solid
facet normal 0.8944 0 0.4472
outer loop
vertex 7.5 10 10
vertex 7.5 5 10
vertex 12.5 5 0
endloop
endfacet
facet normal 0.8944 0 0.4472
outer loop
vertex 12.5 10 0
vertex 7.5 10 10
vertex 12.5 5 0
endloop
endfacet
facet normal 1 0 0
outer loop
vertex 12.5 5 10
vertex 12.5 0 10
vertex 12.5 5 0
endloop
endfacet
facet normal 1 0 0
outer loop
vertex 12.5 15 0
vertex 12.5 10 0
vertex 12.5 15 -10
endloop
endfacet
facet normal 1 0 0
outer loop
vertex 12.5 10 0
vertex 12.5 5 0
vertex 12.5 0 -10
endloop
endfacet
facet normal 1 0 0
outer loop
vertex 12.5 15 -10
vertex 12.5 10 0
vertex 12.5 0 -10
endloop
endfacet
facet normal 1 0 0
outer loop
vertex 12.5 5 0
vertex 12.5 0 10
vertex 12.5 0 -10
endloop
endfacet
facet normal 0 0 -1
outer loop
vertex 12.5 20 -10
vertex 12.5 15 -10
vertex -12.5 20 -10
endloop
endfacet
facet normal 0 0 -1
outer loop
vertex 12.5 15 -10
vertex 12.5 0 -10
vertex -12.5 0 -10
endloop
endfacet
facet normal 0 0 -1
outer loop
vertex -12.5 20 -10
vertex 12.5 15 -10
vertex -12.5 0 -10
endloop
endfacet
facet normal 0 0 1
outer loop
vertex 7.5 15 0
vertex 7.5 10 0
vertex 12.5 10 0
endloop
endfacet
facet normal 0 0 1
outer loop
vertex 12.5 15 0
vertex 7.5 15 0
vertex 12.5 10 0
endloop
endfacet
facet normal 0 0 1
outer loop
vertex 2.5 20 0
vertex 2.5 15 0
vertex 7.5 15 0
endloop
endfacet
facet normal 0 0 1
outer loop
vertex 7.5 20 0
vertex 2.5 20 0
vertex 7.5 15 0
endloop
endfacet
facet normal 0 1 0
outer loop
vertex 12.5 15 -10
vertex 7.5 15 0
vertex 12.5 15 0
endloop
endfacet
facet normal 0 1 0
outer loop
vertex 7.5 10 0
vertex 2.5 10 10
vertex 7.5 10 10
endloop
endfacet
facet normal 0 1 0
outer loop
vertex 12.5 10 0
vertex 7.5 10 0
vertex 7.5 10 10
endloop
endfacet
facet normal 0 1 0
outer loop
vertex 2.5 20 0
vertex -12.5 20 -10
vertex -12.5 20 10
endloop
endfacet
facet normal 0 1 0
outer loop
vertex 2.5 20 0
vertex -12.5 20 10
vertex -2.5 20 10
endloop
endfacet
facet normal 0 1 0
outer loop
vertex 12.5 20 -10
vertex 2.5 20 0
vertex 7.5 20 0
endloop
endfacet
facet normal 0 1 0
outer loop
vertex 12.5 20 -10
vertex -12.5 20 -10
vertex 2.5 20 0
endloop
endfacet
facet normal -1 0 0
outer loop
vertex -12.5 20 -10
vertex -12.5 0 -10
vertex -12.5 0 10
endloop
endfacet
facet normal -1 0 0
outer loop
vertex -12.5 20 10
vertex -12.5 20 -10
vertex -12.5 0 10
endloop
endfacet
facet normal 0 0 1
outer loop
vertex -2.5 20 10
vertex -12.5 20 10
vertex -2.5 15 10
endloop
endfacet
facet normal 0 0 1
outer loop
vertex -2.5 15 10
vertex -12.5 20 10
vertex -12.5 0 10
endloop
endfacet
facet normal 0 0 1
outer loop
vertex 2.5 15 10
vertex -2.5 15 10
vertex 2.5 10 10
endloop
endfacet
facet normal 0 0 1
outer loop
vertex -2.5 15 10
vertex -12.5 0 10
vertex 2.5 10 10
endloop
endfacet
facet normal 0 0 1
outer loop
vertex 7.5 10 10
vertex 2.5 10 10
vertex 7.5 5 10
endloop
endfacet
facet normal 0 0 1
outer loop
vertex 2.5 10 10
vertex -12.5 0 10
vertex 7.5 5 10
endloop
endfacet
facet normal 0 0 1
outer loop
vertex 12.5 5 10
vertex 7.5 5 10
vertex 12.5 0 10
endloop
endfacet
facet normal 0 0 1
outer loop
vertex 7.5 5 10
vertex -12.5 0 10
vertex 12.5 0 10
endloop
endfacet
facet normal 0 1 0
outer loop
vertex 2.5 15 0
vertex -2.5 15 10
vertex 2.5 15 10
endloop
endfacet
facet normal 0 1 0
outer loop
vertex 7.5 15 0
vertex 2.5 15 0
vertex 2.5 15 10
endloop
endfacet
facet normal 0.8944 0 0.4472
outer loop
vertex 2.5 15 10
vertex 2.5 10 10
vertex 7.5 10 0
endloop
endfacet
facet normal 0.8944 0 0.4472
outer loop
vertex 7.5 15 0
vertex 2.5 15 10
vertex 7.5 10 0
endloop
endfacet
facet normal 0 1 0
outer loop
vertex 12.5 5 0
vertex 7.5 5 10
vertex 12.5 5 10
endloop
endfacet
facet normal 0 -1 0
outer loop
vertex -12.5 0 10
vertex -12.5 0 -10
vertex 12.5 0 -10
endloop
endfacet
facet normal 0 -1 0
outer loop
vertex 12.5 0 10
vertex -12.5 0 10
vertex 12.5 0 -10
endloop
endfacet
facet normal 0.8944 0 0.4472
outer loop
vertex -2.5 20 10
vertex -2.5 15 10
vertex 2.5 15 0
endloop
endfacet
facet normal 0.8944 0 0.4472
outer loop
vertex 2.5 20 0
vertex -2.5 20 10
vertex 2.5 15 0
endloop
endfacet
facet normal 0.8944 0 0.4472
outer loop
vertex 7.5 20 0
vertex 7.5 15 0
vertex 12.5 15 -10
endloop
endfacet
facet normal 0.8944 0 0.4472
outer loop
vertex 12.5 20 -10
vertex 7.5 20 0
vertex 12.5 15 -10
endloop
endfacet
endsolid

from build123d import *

# Parameters (mm, degrees)
SKETCH_1_W      = 25
SKETCH_1_H      = 20
EXTRUDE_1_DEPTH = 5
EXTRUDE_2_DEPTH = 10
EXTRUDE_4_DEPTH = 20
EXTRUDE_5_DEPTH = 15


with BuildPart() as part:
    # 草圖1 → 填料-伸長1 (new body)
    with BuildSketch(Plane(origin=(0, 0, 0), x_dir=(1, 0, 0), z_dir=(0, 1, 0))):
        Rectangle(SKETCH_1_W, SKETCH_1_H)
    extrude(amount=EXTRUDE_1_DEPTH)

    # 草圖1<3> → 填料-伸長2 (add)
    with BuildSketch(Plane(origin=(0, 0, 0), x_dir=(1, 0, 0), z_dir=(0, 1, 0))):
        Polygon((7.5, -10), (12.5, 0), (12.5, 10), (-12.5, 10), (-12.5, -10), align=None)
    extrude(amount=EXTRUDE_2_DEPTH)

    # 草圖1<5> → 填料-伸長4 (add)
    with BuildSketch(Plane(origin=(0, 0, 0), x_dir=(1, 0, 0), z_dir=(0, 1, 0))):
        Polygon((-2.5, -10), (2.5, 0), (7.5, 0), (12.5, 10), (-12.5, 10), (-12.5, -10), align=None)
    extrude(amount=EXTRUDE_4_DEPTH)

    # 草圖1<6> → 填料-伸長5 (add)
    with BuildSketch(Plane(origin=(0, 0, 0), x_dir=(1, 0, 0), z_dir=(0, 1, 0))):
        Polygon((7.5, 0), (2.5, 0), (-2.5, -10), (2.5, -10), align=None)
        Polygon((12.5, 10), (7.5, 0), (12.5, 0), align=None)
    extrude(amount=EXTRUDE_5_DEPTH)


solid = part.part
